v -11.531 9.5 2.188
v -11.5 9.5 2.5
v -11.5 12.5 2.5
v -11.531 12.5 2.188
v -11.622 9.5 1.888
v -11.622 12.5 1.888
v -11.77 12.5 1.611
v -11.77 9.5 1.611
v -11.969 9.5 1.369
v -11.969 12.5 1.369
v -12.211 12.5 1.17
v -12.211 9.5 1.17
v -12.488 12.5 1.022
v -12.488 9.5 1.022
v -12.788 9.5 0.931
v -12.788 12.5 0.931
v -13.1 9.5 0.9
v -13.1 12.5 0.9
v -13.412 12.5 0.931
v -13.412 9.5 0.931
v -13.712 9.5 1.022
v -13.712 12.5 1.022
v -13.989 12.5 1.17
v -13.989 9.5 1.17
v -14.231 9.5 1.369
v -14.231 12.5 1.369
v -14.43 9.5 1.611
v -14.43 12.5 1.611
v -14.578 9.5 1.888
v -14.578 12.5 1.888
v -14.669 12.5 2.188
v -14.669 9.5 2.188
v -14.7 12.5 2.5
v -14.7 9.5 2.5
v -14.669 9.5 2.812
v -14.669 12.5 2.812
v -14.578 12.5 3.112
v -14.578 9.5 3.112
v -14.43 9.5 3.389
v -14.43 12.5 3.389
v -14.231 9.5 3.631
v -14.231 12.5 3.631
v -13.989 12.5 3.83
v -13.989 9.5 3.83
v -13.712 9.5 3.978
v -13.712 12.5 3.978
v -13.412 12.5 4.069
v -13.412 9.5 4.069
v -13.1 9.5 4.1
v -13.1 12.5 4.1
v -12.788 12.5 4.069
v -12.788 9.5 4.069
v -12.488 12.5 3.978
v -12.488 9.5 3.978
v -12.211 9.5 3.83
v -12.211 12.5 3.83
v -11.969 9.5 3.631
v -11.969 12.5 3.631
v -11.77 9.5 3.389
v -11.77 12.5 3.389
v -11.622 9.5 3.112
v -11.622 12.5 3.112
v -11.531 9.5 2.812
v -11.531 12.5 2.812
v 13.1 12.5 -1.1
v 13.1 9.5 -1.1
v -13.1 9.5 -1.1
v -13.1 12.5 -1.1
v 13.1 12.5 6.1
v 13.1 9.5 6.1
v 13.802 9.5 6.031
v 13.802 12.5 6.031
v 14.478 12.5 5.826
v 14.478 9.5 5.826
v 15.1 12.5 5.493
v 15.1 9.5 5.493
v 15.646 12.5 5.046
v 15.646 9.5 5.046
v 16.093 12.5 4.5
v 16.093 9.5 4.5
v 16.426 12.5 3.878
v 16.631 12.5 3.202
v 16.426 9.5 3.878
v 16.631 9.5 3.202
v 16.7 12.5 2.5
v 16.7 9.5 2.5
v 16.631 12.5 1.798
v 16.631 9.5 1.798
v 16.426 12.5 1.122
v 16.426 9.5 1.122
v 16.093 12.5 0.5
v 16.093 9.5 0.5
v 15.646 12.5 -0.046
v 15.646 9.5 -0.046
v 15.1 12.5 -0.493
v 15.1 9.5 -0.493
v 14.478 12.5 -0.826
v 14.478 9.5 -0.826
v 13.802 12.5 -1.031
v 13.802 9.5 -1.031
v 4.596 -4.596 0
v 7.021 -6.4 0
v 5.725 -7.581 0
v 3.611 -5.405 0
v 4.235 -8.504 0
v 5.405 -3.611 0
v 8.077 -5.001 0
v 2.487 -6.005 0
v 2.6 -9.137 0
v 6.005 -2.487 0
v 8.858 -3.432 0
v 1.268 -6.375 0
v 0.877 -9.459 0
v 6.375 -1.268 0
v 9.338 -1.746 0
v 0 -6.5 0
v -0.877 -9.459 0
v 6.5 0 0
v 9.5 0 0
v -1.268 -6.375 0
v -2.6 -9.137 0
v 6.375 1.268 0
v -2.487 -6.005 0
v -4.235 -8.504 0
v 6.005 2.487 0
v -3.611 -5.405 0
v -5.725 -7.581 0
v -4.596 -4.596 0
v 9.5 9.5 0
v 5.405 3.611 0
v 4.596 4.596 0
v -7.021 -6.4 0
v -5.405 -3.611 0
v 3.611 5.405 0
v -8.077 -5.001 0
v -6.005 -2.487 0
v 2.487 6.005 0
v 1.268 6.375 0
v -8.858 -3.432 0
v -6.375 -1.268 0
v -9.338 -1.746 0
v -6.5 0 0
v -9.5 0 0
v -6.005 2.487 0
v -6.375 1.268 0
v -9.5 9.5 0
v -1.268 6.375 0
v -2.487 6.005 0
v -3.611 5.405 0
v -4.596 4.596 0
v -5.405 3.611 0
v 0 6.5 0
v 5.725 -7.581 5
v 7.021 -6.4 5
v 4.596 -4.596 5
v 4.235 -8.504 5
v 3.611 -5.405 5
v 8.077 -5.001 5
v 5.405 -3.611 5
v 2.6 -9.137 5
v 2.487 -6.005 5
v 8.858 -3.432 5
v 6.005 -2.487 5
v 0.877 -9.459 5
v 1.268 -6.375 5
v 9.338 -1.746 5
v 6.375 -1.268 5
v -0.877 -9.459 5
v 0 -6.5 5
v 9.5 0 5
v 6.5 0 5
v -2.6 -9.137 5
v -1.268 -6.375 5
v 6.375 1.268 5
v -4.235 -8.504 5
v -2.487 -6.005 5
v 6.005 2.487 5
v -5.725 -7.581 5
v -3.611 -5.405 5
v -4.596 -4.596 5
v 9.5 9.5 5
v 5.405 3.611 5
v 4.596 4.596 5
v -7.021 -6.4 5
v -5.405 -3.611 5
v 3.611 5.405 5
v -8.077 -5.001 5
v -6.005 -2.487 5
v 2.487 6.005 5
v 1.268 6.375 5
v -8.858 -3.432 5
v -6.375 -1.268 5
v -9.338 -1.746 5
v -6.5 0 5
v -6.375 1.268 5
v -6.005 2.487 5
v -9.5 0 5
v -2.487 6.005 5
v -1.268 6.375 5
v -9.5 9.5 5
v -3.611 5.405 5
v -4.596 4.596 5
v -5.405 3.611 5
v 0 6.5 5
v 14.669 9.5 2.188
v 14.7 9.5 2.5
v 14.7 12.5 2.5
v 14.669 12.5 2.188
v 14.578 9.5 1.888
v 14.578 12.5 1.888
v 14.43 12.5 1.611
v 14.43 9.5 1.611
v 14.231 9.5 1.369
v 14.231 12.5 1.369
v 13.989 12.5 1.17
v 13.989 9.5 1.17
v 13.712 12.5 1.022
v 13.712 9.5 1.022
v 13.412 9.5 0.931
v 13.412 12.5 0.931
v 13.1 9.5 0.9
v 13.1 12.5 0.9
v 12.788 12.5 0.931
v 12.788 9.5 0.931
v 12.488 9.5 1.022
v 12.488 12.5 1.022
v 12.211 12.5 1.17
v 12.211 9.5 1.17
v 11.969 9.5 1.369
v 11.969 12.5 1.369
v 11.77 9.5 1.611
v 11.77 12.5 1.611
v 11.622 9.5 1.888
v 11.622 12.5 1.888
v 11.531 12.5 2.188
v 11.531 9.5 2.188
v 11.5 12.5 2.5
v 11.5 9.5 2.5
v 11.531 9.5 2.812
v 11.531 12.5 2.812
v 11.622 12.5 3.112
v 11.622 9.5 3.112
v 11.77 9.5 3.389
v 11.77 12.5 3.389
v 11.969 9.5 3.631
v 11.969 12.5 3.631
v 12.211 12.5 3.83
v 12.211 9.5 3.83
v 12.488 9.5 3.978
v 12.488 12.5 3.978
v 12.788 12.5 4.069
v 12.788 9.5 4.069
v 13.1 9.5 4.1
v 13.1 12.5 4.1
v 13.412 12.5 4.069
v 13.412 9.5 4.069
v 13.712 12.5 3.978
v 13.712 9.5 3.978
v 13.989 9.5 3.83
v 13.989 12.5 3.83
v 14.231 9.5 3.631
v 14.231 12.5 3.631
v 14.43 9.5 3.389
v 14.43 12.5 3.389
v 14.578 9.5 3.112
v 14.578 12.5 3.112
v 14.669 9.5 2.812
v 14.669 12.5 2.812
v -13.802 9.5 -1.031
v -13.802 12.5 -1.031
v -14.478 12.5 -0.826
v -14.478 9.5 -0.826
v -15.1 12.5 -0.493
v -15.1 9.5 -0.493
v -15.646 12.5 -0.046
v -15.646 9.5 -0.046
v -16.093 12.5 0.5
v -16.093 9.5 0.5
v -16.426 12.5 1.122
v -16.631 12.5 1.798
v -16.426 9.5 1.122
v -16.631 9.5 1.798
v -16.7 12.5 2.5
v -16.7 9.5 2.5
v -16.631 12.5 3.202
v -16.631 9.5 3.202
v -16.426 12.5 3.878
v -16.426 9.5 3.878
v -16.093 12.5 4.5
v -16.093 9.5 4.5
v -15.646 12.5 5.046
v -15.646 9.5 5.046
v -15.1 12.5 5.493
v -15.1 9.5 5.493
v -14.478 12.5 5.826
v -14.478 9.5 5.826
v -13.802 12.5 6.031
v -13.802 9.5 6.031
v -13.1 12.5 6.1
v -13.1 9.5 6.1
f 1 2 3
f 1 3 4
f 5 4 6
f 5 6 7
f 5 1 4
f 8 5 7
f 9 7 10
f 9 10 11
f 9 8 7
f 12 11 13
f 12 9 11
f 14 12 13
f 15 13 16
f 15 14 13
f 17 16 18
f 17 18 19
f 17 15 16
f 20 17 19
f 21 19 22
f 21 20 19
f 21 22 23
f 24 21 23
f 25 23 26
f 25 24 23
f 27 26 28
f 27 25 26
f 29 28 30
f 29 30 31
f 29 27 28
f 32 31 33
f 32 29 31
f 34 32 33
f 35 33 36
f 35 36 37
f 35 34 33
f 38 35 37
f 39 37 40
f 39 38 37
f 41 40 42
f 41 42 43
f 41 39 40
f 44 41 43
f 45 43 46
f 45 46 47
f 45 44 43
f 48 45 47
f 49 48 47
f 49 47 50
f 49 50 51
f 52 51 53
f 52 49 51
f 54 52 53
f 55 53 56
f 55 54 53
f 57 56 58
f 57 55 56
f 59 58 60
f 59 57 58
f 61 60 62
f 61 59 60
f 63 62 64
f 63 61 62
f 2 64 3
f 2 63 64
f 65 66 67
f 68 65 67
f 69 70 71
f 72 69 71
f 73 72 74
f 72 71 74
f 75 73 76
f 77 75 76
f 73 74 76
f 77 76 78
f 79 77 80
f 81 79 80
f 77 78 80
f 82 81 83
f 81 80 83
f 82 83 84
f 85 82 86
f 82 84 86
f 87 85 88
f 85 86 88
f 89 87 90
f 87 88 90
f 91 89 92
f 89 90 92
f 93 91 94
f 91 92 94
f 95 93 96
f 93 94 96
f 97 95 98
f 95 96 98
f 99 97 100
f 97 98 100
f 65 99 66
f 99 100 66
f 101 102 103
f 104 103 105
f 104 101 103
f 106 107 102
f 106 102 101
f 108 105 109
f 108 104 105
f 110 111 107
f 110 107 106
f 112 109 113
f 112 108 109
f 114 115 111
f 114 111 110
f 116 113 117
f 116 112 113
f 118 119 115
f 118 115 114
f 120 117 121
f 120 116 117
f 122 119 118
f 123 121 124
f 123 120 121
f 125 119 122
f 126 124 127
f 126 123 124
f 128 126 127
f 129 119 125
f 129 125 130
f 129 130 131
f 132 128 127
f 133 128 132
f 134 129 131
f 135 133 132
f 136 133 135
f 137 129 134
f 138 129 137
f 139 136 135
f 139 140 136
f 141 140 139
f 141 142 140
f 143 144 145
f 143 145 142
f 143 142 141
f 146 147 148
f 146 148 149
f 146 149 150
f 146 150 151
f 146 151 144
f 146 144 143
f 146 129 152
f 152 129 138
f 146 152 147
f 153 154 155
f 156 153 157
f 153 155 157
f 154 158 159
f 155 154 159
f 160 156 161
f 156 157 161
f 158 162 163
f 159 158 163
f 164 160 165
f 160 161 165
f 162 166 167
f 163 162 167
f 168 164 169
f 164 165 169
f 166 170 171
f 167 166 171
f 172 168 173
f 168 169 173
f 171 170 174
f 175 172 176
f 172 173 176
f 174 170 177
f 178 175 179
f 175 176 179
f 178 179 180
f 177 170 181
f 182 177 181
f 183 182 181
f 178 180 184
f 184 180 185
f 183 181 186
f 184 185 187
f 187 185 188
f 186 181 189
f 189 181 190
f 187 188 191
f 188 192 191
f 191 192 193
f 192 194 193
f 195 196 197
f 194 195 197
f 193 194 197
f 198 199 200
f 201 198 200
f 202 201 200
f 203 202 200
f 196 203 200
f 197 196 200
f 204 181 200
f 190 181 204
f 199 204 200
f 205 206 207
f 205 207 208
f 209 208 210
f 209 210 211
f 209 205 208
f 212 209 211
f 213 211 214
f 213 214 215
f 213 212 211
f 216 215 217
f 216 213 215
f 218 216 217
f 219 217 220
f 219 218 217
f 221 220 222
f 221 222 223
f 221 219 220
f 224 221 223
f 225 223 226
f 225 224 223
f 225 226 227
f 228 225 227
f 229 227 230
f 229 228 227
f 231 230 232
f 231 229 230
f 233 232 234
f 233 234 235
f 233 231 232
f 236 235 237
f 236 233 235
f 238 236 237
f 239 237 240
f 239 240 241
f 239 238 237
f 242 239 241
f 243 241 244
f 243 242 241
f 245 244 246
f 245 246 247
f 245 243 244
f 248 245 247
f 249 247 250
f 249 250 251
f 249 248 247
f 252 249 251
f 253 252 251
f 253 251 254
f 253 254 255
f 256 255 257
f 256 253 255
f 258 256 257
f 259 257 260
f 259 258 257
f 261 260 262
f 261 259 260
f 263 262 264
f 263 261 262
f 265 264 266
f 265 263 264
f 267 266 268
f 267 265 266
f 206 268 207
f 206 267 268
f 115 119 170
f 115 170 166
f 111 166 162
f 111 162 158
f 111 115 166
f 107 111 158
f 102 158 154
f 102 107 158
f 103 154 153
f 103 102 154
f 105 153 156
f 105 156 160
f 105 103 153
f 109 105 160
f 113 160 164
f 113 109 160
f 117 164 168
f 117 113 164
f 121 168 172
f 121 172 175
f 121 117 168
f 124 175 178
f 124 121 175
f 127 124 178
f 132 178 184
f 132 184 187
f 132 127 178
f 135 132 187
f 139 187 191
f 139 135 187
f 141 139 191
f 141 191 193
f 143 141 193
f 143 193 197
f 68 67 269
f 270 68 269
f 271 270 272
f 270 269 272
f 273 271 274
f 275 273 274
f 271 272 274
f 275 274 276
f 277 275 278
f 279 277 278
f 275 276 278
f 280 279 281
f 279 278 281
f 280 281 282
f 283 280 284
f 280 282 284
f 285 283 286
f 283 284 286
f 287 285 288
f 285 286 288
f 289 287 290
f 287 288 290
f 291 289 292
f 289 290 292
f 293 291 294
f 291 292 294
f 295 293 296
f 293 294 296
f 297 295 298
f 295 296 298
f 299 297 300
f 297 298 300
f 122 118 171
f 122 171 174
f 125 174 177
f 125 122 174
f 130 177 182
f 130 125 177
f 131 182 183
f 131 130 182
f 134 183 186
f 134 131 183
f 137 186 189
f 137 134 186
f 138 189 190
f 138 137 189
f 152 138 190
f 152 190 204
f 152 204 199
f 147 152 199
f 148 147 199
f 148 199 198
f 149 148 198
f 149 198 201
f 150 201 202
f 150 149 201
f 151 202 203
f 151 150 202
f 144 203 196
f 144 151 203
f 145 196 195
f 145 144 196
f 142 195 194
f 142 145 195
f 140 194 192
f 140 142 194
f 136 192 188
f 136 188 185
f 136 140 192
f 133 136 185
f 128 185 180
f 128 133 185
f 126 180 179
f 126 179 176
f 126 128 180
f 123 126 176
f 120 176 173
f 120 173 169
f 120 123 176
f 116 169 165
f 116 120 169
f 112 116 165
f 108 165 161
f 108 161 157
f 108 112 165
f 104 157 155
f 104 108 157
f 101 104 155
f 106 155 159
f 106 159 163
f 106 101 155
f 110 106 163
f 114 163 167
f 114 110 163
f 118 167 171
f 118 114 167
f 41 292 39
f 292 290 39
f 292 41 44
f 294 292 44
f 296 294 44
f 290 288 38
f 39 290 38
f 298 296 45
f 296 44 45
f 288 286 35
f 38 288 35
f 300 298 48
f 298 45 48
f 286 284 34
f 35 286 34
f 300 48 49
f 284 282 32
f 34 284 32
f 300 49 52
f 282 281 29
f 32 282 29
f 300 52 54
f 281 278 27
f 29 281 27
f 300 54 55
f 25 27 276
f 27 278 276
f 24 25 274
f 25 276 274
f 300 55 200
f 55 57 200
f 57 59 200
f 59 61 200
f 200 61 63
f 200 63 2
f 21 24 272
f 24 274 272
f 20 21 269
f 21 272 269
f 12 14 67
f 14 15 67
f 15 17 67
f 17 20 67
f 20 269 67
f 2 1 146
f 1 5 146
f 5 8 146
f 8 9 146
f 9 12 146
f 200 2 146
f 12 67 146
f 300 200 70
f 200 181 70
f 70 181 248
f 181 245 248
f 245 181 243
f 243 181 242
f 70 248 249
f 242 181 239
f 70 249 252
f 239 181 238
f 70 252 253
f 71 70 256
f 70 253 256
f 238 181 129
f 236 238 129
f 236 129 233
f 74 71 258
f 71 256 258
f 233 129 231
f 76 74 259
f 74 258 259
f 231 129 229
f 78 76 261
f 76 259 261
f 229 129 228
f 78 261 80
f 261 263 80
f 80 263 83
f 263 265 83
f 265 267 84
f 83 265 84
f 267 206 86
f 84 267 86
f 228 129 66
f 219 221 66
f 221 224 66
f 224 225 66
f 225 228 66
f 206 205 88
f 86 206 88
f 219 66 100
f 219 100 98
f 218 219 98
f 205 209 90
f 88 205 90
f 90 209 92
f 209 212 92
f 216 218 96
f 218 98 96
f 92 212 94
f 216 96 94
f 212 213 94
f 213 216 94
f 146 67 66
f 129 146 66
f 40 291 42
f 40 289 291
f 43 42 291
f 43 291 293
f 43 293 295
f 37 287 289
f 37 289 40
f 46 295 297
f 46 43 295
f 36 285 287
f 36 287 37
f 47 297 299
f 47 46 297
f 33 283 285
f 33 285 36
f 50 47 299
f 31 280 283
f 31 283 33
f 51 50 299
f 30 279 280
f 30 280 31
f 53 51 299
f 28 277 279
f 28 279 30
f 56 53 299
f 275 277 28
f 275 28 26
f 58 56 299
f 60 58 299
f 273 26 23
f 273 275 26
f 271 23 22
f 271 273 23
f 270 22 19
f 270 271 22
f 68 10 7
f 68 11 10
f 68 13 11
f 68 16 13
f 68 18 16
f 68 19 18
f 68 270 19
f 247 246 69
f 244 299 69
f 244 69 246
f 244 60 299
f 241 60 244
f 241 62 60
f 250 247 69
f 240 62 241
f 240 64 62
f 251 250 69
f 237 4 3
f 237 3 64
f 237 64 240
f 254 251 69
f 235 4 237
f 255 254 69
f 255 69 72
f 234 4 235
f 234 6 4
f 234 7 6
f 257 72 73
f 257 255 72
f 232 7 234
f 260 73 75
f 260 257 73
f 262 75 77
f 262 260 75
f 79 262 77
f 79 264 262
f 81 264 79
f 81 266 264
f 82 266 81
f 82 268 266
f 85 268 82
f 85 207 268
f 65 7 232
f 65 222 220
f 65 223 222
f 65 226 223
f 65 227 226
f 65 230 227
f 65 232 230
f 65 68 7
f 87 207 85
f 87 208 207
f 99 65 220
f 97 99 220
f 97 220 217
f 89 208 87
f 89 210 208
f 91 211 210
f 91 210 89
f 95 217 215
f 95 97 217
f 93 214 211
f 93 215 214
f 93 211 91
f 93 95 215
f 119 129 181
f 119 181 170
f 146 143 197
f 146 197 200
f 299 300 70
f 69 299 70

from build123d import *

# Parameters (mm, degrees)
SKETCH1_R           = 6.5
BOSS_EXTRUDE1_DEPTH = 5
SKETCH2_R           = 1.6
BOSS_EXTRUDE2_DEPTH = 3


with BuildPart() as part:
    # Sketch1 → Boss-Extrude1 (new body)
    with BuildSketch(Plane.XY):
        with BuildLine():
            Line((-9.5, 0), (-9.5, 9.5))
            Line((-9.5, 9.5), (9.5, 9.5))
            Line((9.5, 9.5), (9.5, 0))
            ThreePointArc((9.5, 0), (0, -9.5), (-9.5, 0))
        make_face()
        Circle(SKETCH1_R, mode=Mode.SUBTRACT)
    extrude(amount=BOSS_EXTRUDE1_DEPTH)

    # Sketch2 → Boss-Extrude2 (add)
    with BuildSketch(Plane(origin=(0, 9.5, 0), x_dir=(1, 0, 0), z_dir=(0, 1, 0))):
        with BuildLine():
            Line((13.1, 1.1), (-13.1, 1.1))
            ThreePointArc((-13.1, 1.1), (-16.7, -2.5), (-13.1, -6.1))
            Line((-13.1, -6.1), (13.1, -6.1))
            ThreePointArc((13.1, -6.1), (16.7, -2.5), (13.1, 1.1))
        make_face()
        with Locations((-13.1, -2.5)):
            Circle(SKETCH2_R, mode=Mode.SUBTRACT)
        with Locations((13.1, -2.5)):
            Circle(SKETCH2_R, mode=Mode.SUBTRACT)
    extrude(amount=BOSS_EXTRUDE2_DEPTH)


solid = part.part
